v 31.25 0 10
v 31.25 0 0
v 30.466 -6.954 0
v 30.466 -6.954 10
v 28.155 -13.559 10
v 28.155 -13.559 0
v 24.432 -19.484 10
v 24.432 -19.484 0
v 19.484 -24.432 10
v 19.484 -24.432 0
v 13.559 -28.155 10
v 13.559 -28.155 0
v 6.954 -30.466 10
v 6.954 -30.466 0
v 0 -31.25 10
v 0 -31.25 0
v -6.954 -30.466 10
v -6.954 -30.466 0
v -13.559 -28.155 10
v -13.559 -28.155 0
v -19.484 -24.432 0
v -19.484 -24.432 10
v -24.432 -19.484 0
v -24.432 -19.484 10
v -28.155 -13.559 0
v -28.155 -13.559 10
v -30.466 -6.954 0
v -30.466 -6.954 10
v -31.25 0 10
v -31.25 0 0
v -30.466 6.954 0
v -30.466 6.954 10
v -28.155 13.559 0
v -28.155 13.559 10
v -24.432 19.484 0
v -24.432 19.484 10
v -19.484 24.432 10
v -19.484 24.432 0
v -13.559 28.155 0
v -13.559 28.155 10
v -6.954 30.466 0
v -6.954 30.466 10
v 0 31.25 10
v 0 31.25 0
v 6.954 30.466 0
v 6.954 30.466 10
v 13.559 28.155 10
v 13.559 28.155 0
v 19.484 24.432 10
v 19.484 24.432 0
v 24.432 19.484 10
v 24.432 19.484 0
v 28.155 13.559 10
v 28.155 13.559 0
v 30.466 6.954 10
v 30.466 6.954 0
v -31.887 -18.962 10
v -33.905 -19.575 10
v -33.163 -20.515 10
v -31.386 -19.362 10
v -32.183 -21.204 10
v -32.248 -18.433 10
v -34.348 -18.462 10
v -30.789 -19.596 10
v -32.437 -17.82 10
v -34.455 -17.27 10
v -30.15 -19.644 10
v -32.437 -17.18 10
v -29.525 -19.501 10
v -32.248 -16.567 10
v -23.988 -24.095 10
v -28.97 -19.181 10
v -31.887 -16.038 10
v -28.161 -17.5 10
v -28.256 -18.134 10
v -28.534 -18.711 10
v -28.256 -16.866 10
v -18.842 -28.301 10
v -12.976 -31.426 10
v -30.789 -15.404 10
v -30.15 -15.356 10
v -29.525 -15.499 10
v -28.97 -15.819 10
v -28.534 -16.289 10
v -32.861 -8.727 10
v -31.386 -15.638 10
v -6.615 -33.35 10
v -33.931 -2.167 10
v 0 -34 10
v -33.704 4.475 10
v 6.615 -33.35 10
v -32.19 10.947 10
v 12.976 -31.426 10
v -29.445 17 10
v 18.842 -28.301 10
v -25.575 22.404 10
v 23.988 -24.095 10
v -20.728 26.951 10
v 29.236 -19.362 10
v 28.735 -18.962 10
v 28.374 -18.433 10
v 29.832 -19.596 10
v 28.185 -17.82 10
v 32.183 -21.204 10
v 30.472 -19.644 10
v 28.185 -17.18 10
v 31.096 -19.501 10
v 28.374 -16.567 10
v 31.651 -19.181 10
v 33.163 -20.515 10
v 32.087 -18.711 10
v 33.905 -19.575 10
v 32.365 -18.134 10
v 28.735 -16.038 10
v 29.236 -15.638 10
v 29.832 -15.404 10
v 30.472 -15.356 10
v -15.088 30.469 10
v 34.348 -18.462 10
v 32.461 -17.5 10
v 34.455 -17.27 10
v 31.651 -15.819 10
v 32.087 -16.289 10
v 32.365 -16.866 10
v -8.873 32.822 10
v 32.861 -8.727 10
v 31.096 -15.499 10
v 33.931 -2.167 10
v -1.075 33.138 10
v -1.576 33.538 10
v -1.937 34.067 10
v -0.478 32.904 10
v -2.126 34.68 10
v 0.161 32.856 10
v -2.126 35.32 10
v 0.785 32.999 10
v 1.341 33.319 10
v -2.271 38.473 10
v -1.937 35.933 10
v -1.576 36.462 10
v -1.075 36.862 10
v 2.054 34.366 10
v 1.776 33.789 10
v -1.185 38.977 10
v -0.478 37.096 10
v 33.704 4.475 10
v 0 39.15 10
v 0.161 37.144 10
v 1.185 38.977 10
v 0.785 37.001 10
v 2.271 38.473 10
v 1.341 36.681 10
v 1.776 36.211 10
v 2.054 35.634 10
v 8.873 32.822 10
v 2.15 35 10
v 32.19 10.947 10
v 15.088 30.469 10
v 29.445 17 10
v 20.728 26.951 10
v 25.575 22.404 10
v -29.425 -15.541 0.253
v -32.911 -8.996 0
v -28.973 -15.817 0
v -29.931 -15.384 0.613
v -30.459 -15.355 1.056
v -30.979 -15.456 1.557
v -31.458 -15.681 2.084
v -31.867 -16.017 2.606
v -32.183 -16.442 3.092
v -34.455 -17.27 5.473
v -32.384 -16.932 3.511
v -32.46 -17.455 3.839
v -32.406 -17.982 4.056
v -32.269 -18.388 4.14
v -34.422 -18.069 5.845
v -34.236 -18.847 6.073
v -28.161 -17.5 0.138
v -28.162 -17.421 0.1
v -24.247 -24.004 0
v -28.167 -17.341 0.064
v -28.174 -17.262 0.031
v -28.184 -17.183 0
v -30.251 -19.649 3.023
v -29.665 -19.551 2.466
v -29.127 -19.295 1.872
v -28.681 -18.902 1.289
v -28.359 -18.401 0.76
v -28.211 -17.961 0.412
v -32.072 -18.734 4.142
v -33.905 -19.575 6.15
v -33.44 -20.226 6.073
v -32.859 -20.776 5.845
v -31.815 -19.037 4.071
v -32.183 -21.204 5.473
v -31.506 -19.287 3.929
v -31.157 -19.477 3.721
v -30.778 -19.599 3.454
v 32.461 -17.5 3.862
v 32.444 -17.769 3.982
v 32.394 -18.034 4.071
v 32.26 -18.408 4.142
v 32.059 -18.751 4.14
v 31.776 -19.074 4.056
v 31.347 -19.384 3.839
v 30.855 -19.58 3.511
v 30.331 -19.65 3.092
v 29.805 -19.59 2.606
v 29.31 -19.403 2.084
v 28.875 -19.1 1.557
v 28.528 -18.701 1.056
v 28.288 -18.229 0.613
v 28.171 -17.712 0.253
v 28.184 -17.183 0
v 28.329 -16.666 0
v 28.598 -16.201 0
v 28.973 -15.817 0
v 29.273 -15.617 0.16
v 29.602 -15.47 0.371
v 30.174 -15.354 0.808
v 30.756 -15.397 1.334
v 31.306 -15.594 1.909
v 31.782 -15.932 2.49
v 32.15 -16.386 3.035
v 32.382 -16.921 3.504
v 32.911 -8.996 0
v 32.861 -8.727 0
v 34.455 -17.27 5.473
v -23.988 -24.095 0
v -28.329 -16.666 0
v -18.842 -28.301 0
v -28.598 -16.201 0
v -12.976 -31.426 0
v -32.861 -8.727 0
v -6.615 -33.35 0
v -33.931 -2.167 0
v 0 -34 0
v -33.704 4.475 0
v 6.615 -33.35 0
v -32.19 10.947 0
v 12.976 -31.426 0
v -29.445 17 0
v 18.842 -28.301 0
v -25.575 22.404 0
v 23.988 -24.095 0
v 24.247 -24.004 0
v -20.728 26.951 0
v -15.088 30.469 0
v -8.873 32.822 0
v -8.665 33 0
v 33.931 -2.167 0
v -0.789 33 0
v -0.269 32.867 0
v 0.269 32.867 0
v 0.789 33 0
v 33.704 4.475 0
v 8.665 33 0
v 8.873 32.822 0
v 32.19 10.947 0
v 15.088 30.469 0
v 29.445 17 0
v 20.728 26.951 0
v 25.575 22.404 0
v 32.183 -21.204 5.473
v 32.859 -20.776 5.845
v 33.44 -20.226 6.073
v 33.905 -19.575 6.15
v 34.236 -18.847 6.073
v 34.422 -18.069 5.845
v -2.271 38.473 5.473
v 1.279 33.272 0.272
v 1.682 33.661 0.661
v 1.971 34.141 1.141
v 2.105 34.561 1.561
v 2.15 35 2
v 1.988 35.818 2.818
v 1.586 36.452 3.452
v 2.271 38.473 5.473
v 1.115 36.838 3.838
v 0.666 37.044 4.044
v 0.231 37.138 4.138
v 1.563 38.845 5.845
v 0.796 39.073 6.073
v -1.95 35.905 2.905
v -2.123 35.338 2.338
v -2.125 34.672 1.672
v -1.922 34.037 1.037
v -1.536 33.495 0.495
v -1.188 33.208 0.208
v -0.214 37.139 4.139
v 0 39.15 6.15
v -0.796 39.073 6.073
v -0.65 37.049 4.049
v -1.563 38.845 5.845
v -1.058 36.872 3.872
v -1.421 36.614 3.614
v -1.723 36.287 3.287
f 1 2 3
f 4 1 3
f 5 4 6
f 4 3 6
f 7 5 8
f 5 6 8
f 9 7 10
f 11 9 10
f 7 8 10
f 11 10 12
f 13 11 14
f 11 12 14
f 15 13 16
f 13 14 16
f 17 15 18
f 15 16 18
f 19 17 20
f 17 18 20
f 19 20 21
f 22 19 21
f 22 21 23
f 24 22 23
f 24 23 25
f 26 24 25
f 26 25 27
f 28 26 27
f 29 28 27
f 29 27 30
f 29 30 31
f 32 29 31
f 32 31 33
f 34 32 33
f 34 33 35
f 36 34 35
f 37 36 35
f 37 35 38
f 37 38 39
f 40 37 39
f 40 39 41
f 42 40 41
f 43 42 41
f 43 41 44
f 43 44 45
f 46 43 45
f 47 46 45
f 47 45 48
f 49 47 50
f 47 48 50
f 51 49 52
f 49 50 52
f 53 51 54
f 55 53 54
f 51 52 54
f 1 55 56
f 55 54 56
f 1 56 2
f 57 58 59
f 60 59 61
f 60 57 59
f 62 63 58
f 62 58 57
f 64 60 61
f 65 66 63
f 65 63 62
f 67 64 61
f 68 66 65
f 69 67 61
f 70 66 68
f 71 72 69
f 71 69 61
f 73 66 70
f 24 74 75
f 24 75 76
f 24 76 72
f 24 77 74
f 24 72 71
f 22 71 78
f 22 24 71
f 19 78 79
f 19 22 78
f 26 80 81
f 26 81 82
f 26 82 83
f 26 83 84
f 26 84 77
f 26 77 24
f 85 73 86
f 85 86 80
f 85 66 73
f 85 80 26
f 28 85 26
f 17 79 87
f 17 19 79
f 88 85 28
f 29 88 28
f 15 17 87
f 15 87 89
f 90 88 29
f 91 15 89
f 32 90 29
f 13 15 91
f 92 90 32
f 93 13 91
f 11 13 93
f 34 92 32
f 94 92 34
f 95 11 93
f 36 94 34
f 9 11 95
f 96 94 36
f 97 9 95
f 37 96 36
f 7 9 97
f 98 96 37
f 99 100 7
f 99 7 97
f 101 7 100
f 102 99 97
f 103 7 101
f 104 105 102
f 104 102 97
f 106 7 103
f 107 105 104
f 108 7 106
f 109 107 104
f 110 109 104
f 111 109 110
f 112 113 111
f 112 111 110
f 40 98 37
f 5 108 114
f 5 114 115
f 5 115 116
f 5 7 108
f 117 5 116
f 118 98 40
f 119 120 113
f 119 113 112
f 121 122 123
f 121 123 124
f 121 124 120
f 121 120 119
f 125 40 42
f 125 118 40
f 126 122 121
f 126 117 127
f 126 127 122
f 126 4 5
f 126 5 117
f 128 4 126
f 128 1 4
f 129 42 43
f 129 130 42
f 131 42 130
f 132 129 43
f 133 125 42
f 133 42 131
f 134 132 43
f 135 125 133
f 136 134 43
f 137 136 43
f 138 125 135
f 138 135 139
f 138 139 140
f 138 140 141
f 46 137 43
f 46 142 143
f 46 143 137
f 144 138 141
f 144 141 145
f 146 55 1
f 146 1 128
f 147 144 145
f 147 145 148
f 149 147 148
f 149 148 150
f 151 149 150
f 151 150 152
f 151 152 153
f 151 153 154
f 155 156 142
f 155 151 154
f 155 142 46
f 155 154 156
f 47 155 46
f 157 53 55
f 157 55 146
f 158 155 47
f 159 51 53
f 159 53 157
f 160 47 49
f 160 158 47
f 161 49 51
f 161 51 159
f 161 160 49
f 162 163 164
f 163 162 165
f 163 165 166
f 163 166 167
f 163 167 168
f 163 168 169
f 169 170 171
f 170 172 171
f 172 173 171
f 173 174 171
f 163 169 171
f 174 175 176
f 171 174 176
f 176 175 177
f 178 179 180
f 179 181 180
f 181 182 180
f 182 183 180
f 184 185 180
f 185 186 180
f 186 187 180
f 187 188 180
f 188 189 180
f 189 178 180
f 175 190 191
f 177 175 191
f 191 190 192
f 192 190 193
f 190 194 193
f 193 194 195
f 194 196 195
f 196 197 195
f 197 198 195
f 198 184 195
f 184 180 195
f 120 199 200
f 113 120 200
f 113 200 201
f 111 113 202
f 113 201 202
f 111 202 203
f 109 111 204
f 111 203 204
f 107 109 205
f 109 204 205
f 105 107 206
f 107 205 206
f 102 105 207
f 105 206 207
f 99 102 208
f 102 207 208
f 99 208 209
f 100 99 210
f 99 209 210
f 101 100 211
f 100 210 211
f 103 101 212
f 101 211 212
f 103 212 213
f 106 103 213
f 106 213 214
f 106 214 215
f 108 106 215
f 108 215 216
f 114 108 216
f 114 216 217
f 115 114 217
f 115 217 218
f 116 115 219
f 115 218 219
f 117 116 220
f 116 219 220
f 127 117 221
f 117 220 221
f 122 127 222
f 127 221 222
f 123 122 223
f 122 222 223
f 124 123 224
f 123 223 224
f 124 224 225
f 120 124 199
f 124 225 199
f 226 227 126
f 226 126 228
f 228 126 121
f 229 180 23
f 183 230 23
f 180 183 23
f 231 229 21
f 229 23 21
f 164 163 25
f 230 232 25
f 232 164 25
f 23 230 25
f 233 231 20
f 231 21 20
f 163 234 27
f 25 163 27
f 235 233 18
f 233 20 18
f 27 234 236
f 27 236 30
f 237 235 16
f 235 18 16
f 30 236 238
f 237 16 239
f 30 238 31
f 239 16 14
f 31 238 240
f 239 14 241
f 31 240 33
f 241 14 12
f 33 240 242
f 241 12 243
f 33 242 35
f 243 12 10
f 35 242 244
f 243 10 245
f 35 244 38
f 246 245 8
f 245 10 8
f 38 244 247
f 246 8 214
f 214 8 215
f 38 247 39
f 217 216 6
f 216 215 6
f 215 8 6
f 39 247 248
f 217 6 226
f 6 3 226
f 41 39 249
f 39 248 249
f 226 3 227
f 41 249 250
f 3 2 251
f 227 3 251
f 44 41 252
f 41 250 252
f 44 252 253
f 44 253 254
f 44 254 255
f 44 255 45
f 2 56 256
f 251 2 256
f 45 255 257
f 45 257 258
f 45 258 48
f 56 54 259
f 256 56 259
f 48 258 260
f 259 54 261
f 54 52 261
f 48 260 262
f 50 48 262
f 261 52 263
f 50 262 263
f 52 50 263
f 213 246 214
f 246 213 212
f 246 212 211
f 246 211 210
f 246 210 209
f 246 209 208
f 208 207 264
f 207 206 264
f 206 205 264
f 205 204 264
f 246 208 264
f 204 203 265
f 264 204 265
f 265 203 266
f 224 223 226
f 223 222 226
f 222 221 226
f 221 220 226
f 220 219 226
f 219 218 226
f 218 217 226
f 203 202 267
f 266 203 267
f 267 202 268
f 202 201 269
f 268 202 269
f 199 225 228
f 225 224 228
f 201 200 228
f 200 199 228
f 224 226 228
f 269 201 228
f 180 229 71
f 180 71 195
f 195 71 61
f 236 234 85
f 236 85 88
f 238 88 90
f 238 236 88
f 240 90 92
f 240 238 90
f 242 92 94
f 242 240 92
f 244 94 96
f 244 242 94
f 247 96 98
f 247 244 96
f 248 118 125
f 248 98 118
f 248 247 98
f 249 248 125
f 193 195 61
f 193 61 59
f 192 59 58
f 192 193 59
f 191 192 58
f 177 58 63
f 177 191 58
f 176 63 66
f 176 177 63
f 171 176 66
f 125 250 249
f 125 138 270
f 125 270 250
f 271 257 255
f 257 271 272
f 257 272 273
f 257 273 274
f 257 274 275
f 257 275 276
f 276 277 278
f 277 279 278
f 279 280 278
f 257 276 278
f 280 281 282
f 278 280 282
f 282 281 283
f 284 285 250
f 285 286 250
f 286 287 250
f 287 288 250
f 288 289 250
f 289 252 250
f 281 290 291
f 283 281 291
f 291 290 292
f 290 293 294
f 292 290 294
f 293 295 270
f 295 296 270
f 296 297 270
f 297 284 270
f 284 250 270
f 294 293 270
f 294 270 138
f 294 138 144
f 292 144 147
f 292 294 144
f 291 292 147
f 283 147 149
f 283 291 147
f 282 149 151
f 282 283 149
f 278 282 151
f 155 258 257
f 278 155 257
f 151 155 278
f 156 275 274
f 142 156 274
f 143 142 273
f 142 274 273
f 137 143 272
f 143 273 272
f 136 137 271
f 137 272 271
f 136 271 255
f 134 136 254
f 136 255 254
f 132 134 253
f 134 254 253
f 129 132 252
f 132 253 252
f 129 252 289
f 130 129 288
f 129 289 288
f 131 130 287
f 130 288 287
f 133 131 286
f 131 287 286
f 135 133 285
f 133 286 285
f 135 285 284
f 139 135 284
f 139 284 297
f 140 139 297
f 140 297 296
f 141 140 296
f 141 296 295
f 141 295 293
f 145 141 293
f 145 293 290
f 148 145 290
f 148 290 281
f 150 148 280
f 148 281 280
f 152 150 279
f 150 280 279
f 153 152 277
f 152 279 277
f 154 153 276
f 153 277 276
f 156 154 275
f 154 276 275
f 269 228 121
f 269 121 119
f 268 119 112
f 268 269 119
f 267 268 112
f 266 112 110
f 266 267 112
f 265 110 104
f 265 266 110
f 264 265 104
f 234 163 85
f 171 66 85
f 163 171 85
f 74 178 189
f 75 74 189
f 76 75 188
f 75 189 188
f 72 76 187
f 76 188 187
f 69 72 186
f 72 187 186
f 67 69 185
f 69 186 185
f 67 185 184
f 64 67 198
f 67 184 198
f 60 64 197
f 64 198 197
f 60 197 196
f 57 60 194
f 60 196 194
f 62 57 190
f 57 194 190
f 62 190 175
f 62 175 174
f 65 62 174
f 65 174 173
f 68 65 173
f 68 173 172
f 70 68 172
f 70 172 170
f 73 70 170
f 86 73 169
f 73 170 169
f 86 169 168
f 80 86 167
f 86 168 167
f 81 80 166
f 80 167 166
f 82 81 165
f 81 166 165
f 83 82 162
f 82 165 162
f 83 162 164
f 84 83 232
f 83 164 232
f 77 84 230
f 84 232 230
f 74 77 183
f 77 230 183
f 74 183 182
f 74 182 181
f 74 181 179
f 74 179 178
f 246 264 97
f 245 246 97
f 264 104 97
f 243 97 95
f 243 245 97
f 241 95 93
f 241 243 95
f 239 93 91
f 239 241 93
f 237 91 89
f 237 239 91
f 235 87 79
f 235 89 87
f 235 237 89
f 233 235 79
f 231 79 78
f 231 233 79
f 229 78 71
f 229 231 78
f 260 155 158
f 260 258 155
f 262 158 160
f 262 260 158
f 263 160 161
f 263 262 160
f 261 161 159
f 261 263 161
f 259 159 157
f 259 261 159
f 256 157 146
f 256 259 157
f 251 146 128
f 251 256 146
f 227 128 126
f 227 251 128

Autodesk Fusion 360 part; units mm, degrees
sketch "Sketch2" plane through (0, 0, 0) normal (0, 0, 1) x (1, 0, 0)
  circle A0 centre (0, 0) radius 34
  circle A1 centre (0, 0) radius 22.5
  circle A2 centre (0, 0) radius 31.25
  line L0 (0, 0) -> (0, 35) construction
  circle A3 centre (0, 35) radius 2.15
  circle A4 centre (0, 35) radius 4.15
  circle A5 centre (-30.3109, -17.5) radius 4.15
  circle A6 centre (-30.3109, -17.5) radius 2.15
  circle A7 centre (30.3109, -17.5) radius 4.15
  circle A8 centre (30.3109, -17.5) radius 2.15
  dimension "d19" = 68
  dimension "d21" = 45
  dimension "d29" = 62.5
  dimension "d75" = 35
  dimension "d76" = 4.3
  dimension "d78" = 2
  dimension "d80" = 360
extrude "main" add sketch "Sketch2" along normal blind 10 contours A0 A2 A4 A7 | A0 A2 A3 A4 | A0 A3 A4 | A0 A7 A8 | A0 A2 A7 A8 | A0 A2 A4 A5 | A0 A2 A5 A7 | A0 A2 A5 A6 | A0 A5 A6
chamfer "Chamfer4" distance 5 angle 45 6 edges at (31.2257, -13.4521, 5) (3.963, 33.7683, 5) (-3.963, 33.7683, 5) (-31.2257, -13.4521, 5) (-27.2627, -20.3162, 5) (27.2627, -20.3162, 5)
sketch "Sketch4" plane through (0, 0, 0) normal (1, 0, 0) x (0, 1, 0)
  line L0 (0, 0) -> (33, 0) construction
  line L1 (33, 0) -> (49.4315, 16.4315)
  line L2 (33, 0) -> (56.2377, 0)
  line L3 (49.4315, 16.4315) -> (49.4315, 0)
  dimension "d69" = 33
  dimension "d70" = 45
extrude "Extrude8" cut sketch "Sketch4" along normal mid plane 20
pattern_circular "C-Pattern3" count 3 over 360 about axis through (0, 0, 1.75) along (0, 0, 1) of "Extrude8"
equation "gear_ratio = 6"
equation "gear_Ns = if(is_Nema_17 == 1; 12; 15)"
equation "gear_Nr = ( gear_ratio - 1 ) * gear_Ns"
equation "gear_OD = ( gear_Nr * diameter_scale * module ) + 8 mm"
equation "ring_width = 52 mm"
equation "m3_hole_thickness = 2 mm"
equation "m3_inserts = 4.3 mm"
equation "d19 = gear_OD"
equation "output_bearing_od = 47 mm"
equation "d21 = output_bearing_od - 2 mm"
equation "d29 = gear_OD - wall_thickness + 1.5 mm"
equation "wall_thickness = 7 mm"
equation "d33 = height"
equation "height = 10 mm"
equation "module = 1"
equation "helix_angle = 0 deg"
equation "diameter_scale = ( 1 / cos(helix_angle) ) * 1 mm"
equation "d69 = ( gear_OD / 2 ) - 1 mm"
equation "d75 = ( gear_OD / 2 ) + 1 mm"
equation "d76 = m3_inserts"
equation "d78 = m3_hole_thickness"
equation "is_Nema_17 = 1"
